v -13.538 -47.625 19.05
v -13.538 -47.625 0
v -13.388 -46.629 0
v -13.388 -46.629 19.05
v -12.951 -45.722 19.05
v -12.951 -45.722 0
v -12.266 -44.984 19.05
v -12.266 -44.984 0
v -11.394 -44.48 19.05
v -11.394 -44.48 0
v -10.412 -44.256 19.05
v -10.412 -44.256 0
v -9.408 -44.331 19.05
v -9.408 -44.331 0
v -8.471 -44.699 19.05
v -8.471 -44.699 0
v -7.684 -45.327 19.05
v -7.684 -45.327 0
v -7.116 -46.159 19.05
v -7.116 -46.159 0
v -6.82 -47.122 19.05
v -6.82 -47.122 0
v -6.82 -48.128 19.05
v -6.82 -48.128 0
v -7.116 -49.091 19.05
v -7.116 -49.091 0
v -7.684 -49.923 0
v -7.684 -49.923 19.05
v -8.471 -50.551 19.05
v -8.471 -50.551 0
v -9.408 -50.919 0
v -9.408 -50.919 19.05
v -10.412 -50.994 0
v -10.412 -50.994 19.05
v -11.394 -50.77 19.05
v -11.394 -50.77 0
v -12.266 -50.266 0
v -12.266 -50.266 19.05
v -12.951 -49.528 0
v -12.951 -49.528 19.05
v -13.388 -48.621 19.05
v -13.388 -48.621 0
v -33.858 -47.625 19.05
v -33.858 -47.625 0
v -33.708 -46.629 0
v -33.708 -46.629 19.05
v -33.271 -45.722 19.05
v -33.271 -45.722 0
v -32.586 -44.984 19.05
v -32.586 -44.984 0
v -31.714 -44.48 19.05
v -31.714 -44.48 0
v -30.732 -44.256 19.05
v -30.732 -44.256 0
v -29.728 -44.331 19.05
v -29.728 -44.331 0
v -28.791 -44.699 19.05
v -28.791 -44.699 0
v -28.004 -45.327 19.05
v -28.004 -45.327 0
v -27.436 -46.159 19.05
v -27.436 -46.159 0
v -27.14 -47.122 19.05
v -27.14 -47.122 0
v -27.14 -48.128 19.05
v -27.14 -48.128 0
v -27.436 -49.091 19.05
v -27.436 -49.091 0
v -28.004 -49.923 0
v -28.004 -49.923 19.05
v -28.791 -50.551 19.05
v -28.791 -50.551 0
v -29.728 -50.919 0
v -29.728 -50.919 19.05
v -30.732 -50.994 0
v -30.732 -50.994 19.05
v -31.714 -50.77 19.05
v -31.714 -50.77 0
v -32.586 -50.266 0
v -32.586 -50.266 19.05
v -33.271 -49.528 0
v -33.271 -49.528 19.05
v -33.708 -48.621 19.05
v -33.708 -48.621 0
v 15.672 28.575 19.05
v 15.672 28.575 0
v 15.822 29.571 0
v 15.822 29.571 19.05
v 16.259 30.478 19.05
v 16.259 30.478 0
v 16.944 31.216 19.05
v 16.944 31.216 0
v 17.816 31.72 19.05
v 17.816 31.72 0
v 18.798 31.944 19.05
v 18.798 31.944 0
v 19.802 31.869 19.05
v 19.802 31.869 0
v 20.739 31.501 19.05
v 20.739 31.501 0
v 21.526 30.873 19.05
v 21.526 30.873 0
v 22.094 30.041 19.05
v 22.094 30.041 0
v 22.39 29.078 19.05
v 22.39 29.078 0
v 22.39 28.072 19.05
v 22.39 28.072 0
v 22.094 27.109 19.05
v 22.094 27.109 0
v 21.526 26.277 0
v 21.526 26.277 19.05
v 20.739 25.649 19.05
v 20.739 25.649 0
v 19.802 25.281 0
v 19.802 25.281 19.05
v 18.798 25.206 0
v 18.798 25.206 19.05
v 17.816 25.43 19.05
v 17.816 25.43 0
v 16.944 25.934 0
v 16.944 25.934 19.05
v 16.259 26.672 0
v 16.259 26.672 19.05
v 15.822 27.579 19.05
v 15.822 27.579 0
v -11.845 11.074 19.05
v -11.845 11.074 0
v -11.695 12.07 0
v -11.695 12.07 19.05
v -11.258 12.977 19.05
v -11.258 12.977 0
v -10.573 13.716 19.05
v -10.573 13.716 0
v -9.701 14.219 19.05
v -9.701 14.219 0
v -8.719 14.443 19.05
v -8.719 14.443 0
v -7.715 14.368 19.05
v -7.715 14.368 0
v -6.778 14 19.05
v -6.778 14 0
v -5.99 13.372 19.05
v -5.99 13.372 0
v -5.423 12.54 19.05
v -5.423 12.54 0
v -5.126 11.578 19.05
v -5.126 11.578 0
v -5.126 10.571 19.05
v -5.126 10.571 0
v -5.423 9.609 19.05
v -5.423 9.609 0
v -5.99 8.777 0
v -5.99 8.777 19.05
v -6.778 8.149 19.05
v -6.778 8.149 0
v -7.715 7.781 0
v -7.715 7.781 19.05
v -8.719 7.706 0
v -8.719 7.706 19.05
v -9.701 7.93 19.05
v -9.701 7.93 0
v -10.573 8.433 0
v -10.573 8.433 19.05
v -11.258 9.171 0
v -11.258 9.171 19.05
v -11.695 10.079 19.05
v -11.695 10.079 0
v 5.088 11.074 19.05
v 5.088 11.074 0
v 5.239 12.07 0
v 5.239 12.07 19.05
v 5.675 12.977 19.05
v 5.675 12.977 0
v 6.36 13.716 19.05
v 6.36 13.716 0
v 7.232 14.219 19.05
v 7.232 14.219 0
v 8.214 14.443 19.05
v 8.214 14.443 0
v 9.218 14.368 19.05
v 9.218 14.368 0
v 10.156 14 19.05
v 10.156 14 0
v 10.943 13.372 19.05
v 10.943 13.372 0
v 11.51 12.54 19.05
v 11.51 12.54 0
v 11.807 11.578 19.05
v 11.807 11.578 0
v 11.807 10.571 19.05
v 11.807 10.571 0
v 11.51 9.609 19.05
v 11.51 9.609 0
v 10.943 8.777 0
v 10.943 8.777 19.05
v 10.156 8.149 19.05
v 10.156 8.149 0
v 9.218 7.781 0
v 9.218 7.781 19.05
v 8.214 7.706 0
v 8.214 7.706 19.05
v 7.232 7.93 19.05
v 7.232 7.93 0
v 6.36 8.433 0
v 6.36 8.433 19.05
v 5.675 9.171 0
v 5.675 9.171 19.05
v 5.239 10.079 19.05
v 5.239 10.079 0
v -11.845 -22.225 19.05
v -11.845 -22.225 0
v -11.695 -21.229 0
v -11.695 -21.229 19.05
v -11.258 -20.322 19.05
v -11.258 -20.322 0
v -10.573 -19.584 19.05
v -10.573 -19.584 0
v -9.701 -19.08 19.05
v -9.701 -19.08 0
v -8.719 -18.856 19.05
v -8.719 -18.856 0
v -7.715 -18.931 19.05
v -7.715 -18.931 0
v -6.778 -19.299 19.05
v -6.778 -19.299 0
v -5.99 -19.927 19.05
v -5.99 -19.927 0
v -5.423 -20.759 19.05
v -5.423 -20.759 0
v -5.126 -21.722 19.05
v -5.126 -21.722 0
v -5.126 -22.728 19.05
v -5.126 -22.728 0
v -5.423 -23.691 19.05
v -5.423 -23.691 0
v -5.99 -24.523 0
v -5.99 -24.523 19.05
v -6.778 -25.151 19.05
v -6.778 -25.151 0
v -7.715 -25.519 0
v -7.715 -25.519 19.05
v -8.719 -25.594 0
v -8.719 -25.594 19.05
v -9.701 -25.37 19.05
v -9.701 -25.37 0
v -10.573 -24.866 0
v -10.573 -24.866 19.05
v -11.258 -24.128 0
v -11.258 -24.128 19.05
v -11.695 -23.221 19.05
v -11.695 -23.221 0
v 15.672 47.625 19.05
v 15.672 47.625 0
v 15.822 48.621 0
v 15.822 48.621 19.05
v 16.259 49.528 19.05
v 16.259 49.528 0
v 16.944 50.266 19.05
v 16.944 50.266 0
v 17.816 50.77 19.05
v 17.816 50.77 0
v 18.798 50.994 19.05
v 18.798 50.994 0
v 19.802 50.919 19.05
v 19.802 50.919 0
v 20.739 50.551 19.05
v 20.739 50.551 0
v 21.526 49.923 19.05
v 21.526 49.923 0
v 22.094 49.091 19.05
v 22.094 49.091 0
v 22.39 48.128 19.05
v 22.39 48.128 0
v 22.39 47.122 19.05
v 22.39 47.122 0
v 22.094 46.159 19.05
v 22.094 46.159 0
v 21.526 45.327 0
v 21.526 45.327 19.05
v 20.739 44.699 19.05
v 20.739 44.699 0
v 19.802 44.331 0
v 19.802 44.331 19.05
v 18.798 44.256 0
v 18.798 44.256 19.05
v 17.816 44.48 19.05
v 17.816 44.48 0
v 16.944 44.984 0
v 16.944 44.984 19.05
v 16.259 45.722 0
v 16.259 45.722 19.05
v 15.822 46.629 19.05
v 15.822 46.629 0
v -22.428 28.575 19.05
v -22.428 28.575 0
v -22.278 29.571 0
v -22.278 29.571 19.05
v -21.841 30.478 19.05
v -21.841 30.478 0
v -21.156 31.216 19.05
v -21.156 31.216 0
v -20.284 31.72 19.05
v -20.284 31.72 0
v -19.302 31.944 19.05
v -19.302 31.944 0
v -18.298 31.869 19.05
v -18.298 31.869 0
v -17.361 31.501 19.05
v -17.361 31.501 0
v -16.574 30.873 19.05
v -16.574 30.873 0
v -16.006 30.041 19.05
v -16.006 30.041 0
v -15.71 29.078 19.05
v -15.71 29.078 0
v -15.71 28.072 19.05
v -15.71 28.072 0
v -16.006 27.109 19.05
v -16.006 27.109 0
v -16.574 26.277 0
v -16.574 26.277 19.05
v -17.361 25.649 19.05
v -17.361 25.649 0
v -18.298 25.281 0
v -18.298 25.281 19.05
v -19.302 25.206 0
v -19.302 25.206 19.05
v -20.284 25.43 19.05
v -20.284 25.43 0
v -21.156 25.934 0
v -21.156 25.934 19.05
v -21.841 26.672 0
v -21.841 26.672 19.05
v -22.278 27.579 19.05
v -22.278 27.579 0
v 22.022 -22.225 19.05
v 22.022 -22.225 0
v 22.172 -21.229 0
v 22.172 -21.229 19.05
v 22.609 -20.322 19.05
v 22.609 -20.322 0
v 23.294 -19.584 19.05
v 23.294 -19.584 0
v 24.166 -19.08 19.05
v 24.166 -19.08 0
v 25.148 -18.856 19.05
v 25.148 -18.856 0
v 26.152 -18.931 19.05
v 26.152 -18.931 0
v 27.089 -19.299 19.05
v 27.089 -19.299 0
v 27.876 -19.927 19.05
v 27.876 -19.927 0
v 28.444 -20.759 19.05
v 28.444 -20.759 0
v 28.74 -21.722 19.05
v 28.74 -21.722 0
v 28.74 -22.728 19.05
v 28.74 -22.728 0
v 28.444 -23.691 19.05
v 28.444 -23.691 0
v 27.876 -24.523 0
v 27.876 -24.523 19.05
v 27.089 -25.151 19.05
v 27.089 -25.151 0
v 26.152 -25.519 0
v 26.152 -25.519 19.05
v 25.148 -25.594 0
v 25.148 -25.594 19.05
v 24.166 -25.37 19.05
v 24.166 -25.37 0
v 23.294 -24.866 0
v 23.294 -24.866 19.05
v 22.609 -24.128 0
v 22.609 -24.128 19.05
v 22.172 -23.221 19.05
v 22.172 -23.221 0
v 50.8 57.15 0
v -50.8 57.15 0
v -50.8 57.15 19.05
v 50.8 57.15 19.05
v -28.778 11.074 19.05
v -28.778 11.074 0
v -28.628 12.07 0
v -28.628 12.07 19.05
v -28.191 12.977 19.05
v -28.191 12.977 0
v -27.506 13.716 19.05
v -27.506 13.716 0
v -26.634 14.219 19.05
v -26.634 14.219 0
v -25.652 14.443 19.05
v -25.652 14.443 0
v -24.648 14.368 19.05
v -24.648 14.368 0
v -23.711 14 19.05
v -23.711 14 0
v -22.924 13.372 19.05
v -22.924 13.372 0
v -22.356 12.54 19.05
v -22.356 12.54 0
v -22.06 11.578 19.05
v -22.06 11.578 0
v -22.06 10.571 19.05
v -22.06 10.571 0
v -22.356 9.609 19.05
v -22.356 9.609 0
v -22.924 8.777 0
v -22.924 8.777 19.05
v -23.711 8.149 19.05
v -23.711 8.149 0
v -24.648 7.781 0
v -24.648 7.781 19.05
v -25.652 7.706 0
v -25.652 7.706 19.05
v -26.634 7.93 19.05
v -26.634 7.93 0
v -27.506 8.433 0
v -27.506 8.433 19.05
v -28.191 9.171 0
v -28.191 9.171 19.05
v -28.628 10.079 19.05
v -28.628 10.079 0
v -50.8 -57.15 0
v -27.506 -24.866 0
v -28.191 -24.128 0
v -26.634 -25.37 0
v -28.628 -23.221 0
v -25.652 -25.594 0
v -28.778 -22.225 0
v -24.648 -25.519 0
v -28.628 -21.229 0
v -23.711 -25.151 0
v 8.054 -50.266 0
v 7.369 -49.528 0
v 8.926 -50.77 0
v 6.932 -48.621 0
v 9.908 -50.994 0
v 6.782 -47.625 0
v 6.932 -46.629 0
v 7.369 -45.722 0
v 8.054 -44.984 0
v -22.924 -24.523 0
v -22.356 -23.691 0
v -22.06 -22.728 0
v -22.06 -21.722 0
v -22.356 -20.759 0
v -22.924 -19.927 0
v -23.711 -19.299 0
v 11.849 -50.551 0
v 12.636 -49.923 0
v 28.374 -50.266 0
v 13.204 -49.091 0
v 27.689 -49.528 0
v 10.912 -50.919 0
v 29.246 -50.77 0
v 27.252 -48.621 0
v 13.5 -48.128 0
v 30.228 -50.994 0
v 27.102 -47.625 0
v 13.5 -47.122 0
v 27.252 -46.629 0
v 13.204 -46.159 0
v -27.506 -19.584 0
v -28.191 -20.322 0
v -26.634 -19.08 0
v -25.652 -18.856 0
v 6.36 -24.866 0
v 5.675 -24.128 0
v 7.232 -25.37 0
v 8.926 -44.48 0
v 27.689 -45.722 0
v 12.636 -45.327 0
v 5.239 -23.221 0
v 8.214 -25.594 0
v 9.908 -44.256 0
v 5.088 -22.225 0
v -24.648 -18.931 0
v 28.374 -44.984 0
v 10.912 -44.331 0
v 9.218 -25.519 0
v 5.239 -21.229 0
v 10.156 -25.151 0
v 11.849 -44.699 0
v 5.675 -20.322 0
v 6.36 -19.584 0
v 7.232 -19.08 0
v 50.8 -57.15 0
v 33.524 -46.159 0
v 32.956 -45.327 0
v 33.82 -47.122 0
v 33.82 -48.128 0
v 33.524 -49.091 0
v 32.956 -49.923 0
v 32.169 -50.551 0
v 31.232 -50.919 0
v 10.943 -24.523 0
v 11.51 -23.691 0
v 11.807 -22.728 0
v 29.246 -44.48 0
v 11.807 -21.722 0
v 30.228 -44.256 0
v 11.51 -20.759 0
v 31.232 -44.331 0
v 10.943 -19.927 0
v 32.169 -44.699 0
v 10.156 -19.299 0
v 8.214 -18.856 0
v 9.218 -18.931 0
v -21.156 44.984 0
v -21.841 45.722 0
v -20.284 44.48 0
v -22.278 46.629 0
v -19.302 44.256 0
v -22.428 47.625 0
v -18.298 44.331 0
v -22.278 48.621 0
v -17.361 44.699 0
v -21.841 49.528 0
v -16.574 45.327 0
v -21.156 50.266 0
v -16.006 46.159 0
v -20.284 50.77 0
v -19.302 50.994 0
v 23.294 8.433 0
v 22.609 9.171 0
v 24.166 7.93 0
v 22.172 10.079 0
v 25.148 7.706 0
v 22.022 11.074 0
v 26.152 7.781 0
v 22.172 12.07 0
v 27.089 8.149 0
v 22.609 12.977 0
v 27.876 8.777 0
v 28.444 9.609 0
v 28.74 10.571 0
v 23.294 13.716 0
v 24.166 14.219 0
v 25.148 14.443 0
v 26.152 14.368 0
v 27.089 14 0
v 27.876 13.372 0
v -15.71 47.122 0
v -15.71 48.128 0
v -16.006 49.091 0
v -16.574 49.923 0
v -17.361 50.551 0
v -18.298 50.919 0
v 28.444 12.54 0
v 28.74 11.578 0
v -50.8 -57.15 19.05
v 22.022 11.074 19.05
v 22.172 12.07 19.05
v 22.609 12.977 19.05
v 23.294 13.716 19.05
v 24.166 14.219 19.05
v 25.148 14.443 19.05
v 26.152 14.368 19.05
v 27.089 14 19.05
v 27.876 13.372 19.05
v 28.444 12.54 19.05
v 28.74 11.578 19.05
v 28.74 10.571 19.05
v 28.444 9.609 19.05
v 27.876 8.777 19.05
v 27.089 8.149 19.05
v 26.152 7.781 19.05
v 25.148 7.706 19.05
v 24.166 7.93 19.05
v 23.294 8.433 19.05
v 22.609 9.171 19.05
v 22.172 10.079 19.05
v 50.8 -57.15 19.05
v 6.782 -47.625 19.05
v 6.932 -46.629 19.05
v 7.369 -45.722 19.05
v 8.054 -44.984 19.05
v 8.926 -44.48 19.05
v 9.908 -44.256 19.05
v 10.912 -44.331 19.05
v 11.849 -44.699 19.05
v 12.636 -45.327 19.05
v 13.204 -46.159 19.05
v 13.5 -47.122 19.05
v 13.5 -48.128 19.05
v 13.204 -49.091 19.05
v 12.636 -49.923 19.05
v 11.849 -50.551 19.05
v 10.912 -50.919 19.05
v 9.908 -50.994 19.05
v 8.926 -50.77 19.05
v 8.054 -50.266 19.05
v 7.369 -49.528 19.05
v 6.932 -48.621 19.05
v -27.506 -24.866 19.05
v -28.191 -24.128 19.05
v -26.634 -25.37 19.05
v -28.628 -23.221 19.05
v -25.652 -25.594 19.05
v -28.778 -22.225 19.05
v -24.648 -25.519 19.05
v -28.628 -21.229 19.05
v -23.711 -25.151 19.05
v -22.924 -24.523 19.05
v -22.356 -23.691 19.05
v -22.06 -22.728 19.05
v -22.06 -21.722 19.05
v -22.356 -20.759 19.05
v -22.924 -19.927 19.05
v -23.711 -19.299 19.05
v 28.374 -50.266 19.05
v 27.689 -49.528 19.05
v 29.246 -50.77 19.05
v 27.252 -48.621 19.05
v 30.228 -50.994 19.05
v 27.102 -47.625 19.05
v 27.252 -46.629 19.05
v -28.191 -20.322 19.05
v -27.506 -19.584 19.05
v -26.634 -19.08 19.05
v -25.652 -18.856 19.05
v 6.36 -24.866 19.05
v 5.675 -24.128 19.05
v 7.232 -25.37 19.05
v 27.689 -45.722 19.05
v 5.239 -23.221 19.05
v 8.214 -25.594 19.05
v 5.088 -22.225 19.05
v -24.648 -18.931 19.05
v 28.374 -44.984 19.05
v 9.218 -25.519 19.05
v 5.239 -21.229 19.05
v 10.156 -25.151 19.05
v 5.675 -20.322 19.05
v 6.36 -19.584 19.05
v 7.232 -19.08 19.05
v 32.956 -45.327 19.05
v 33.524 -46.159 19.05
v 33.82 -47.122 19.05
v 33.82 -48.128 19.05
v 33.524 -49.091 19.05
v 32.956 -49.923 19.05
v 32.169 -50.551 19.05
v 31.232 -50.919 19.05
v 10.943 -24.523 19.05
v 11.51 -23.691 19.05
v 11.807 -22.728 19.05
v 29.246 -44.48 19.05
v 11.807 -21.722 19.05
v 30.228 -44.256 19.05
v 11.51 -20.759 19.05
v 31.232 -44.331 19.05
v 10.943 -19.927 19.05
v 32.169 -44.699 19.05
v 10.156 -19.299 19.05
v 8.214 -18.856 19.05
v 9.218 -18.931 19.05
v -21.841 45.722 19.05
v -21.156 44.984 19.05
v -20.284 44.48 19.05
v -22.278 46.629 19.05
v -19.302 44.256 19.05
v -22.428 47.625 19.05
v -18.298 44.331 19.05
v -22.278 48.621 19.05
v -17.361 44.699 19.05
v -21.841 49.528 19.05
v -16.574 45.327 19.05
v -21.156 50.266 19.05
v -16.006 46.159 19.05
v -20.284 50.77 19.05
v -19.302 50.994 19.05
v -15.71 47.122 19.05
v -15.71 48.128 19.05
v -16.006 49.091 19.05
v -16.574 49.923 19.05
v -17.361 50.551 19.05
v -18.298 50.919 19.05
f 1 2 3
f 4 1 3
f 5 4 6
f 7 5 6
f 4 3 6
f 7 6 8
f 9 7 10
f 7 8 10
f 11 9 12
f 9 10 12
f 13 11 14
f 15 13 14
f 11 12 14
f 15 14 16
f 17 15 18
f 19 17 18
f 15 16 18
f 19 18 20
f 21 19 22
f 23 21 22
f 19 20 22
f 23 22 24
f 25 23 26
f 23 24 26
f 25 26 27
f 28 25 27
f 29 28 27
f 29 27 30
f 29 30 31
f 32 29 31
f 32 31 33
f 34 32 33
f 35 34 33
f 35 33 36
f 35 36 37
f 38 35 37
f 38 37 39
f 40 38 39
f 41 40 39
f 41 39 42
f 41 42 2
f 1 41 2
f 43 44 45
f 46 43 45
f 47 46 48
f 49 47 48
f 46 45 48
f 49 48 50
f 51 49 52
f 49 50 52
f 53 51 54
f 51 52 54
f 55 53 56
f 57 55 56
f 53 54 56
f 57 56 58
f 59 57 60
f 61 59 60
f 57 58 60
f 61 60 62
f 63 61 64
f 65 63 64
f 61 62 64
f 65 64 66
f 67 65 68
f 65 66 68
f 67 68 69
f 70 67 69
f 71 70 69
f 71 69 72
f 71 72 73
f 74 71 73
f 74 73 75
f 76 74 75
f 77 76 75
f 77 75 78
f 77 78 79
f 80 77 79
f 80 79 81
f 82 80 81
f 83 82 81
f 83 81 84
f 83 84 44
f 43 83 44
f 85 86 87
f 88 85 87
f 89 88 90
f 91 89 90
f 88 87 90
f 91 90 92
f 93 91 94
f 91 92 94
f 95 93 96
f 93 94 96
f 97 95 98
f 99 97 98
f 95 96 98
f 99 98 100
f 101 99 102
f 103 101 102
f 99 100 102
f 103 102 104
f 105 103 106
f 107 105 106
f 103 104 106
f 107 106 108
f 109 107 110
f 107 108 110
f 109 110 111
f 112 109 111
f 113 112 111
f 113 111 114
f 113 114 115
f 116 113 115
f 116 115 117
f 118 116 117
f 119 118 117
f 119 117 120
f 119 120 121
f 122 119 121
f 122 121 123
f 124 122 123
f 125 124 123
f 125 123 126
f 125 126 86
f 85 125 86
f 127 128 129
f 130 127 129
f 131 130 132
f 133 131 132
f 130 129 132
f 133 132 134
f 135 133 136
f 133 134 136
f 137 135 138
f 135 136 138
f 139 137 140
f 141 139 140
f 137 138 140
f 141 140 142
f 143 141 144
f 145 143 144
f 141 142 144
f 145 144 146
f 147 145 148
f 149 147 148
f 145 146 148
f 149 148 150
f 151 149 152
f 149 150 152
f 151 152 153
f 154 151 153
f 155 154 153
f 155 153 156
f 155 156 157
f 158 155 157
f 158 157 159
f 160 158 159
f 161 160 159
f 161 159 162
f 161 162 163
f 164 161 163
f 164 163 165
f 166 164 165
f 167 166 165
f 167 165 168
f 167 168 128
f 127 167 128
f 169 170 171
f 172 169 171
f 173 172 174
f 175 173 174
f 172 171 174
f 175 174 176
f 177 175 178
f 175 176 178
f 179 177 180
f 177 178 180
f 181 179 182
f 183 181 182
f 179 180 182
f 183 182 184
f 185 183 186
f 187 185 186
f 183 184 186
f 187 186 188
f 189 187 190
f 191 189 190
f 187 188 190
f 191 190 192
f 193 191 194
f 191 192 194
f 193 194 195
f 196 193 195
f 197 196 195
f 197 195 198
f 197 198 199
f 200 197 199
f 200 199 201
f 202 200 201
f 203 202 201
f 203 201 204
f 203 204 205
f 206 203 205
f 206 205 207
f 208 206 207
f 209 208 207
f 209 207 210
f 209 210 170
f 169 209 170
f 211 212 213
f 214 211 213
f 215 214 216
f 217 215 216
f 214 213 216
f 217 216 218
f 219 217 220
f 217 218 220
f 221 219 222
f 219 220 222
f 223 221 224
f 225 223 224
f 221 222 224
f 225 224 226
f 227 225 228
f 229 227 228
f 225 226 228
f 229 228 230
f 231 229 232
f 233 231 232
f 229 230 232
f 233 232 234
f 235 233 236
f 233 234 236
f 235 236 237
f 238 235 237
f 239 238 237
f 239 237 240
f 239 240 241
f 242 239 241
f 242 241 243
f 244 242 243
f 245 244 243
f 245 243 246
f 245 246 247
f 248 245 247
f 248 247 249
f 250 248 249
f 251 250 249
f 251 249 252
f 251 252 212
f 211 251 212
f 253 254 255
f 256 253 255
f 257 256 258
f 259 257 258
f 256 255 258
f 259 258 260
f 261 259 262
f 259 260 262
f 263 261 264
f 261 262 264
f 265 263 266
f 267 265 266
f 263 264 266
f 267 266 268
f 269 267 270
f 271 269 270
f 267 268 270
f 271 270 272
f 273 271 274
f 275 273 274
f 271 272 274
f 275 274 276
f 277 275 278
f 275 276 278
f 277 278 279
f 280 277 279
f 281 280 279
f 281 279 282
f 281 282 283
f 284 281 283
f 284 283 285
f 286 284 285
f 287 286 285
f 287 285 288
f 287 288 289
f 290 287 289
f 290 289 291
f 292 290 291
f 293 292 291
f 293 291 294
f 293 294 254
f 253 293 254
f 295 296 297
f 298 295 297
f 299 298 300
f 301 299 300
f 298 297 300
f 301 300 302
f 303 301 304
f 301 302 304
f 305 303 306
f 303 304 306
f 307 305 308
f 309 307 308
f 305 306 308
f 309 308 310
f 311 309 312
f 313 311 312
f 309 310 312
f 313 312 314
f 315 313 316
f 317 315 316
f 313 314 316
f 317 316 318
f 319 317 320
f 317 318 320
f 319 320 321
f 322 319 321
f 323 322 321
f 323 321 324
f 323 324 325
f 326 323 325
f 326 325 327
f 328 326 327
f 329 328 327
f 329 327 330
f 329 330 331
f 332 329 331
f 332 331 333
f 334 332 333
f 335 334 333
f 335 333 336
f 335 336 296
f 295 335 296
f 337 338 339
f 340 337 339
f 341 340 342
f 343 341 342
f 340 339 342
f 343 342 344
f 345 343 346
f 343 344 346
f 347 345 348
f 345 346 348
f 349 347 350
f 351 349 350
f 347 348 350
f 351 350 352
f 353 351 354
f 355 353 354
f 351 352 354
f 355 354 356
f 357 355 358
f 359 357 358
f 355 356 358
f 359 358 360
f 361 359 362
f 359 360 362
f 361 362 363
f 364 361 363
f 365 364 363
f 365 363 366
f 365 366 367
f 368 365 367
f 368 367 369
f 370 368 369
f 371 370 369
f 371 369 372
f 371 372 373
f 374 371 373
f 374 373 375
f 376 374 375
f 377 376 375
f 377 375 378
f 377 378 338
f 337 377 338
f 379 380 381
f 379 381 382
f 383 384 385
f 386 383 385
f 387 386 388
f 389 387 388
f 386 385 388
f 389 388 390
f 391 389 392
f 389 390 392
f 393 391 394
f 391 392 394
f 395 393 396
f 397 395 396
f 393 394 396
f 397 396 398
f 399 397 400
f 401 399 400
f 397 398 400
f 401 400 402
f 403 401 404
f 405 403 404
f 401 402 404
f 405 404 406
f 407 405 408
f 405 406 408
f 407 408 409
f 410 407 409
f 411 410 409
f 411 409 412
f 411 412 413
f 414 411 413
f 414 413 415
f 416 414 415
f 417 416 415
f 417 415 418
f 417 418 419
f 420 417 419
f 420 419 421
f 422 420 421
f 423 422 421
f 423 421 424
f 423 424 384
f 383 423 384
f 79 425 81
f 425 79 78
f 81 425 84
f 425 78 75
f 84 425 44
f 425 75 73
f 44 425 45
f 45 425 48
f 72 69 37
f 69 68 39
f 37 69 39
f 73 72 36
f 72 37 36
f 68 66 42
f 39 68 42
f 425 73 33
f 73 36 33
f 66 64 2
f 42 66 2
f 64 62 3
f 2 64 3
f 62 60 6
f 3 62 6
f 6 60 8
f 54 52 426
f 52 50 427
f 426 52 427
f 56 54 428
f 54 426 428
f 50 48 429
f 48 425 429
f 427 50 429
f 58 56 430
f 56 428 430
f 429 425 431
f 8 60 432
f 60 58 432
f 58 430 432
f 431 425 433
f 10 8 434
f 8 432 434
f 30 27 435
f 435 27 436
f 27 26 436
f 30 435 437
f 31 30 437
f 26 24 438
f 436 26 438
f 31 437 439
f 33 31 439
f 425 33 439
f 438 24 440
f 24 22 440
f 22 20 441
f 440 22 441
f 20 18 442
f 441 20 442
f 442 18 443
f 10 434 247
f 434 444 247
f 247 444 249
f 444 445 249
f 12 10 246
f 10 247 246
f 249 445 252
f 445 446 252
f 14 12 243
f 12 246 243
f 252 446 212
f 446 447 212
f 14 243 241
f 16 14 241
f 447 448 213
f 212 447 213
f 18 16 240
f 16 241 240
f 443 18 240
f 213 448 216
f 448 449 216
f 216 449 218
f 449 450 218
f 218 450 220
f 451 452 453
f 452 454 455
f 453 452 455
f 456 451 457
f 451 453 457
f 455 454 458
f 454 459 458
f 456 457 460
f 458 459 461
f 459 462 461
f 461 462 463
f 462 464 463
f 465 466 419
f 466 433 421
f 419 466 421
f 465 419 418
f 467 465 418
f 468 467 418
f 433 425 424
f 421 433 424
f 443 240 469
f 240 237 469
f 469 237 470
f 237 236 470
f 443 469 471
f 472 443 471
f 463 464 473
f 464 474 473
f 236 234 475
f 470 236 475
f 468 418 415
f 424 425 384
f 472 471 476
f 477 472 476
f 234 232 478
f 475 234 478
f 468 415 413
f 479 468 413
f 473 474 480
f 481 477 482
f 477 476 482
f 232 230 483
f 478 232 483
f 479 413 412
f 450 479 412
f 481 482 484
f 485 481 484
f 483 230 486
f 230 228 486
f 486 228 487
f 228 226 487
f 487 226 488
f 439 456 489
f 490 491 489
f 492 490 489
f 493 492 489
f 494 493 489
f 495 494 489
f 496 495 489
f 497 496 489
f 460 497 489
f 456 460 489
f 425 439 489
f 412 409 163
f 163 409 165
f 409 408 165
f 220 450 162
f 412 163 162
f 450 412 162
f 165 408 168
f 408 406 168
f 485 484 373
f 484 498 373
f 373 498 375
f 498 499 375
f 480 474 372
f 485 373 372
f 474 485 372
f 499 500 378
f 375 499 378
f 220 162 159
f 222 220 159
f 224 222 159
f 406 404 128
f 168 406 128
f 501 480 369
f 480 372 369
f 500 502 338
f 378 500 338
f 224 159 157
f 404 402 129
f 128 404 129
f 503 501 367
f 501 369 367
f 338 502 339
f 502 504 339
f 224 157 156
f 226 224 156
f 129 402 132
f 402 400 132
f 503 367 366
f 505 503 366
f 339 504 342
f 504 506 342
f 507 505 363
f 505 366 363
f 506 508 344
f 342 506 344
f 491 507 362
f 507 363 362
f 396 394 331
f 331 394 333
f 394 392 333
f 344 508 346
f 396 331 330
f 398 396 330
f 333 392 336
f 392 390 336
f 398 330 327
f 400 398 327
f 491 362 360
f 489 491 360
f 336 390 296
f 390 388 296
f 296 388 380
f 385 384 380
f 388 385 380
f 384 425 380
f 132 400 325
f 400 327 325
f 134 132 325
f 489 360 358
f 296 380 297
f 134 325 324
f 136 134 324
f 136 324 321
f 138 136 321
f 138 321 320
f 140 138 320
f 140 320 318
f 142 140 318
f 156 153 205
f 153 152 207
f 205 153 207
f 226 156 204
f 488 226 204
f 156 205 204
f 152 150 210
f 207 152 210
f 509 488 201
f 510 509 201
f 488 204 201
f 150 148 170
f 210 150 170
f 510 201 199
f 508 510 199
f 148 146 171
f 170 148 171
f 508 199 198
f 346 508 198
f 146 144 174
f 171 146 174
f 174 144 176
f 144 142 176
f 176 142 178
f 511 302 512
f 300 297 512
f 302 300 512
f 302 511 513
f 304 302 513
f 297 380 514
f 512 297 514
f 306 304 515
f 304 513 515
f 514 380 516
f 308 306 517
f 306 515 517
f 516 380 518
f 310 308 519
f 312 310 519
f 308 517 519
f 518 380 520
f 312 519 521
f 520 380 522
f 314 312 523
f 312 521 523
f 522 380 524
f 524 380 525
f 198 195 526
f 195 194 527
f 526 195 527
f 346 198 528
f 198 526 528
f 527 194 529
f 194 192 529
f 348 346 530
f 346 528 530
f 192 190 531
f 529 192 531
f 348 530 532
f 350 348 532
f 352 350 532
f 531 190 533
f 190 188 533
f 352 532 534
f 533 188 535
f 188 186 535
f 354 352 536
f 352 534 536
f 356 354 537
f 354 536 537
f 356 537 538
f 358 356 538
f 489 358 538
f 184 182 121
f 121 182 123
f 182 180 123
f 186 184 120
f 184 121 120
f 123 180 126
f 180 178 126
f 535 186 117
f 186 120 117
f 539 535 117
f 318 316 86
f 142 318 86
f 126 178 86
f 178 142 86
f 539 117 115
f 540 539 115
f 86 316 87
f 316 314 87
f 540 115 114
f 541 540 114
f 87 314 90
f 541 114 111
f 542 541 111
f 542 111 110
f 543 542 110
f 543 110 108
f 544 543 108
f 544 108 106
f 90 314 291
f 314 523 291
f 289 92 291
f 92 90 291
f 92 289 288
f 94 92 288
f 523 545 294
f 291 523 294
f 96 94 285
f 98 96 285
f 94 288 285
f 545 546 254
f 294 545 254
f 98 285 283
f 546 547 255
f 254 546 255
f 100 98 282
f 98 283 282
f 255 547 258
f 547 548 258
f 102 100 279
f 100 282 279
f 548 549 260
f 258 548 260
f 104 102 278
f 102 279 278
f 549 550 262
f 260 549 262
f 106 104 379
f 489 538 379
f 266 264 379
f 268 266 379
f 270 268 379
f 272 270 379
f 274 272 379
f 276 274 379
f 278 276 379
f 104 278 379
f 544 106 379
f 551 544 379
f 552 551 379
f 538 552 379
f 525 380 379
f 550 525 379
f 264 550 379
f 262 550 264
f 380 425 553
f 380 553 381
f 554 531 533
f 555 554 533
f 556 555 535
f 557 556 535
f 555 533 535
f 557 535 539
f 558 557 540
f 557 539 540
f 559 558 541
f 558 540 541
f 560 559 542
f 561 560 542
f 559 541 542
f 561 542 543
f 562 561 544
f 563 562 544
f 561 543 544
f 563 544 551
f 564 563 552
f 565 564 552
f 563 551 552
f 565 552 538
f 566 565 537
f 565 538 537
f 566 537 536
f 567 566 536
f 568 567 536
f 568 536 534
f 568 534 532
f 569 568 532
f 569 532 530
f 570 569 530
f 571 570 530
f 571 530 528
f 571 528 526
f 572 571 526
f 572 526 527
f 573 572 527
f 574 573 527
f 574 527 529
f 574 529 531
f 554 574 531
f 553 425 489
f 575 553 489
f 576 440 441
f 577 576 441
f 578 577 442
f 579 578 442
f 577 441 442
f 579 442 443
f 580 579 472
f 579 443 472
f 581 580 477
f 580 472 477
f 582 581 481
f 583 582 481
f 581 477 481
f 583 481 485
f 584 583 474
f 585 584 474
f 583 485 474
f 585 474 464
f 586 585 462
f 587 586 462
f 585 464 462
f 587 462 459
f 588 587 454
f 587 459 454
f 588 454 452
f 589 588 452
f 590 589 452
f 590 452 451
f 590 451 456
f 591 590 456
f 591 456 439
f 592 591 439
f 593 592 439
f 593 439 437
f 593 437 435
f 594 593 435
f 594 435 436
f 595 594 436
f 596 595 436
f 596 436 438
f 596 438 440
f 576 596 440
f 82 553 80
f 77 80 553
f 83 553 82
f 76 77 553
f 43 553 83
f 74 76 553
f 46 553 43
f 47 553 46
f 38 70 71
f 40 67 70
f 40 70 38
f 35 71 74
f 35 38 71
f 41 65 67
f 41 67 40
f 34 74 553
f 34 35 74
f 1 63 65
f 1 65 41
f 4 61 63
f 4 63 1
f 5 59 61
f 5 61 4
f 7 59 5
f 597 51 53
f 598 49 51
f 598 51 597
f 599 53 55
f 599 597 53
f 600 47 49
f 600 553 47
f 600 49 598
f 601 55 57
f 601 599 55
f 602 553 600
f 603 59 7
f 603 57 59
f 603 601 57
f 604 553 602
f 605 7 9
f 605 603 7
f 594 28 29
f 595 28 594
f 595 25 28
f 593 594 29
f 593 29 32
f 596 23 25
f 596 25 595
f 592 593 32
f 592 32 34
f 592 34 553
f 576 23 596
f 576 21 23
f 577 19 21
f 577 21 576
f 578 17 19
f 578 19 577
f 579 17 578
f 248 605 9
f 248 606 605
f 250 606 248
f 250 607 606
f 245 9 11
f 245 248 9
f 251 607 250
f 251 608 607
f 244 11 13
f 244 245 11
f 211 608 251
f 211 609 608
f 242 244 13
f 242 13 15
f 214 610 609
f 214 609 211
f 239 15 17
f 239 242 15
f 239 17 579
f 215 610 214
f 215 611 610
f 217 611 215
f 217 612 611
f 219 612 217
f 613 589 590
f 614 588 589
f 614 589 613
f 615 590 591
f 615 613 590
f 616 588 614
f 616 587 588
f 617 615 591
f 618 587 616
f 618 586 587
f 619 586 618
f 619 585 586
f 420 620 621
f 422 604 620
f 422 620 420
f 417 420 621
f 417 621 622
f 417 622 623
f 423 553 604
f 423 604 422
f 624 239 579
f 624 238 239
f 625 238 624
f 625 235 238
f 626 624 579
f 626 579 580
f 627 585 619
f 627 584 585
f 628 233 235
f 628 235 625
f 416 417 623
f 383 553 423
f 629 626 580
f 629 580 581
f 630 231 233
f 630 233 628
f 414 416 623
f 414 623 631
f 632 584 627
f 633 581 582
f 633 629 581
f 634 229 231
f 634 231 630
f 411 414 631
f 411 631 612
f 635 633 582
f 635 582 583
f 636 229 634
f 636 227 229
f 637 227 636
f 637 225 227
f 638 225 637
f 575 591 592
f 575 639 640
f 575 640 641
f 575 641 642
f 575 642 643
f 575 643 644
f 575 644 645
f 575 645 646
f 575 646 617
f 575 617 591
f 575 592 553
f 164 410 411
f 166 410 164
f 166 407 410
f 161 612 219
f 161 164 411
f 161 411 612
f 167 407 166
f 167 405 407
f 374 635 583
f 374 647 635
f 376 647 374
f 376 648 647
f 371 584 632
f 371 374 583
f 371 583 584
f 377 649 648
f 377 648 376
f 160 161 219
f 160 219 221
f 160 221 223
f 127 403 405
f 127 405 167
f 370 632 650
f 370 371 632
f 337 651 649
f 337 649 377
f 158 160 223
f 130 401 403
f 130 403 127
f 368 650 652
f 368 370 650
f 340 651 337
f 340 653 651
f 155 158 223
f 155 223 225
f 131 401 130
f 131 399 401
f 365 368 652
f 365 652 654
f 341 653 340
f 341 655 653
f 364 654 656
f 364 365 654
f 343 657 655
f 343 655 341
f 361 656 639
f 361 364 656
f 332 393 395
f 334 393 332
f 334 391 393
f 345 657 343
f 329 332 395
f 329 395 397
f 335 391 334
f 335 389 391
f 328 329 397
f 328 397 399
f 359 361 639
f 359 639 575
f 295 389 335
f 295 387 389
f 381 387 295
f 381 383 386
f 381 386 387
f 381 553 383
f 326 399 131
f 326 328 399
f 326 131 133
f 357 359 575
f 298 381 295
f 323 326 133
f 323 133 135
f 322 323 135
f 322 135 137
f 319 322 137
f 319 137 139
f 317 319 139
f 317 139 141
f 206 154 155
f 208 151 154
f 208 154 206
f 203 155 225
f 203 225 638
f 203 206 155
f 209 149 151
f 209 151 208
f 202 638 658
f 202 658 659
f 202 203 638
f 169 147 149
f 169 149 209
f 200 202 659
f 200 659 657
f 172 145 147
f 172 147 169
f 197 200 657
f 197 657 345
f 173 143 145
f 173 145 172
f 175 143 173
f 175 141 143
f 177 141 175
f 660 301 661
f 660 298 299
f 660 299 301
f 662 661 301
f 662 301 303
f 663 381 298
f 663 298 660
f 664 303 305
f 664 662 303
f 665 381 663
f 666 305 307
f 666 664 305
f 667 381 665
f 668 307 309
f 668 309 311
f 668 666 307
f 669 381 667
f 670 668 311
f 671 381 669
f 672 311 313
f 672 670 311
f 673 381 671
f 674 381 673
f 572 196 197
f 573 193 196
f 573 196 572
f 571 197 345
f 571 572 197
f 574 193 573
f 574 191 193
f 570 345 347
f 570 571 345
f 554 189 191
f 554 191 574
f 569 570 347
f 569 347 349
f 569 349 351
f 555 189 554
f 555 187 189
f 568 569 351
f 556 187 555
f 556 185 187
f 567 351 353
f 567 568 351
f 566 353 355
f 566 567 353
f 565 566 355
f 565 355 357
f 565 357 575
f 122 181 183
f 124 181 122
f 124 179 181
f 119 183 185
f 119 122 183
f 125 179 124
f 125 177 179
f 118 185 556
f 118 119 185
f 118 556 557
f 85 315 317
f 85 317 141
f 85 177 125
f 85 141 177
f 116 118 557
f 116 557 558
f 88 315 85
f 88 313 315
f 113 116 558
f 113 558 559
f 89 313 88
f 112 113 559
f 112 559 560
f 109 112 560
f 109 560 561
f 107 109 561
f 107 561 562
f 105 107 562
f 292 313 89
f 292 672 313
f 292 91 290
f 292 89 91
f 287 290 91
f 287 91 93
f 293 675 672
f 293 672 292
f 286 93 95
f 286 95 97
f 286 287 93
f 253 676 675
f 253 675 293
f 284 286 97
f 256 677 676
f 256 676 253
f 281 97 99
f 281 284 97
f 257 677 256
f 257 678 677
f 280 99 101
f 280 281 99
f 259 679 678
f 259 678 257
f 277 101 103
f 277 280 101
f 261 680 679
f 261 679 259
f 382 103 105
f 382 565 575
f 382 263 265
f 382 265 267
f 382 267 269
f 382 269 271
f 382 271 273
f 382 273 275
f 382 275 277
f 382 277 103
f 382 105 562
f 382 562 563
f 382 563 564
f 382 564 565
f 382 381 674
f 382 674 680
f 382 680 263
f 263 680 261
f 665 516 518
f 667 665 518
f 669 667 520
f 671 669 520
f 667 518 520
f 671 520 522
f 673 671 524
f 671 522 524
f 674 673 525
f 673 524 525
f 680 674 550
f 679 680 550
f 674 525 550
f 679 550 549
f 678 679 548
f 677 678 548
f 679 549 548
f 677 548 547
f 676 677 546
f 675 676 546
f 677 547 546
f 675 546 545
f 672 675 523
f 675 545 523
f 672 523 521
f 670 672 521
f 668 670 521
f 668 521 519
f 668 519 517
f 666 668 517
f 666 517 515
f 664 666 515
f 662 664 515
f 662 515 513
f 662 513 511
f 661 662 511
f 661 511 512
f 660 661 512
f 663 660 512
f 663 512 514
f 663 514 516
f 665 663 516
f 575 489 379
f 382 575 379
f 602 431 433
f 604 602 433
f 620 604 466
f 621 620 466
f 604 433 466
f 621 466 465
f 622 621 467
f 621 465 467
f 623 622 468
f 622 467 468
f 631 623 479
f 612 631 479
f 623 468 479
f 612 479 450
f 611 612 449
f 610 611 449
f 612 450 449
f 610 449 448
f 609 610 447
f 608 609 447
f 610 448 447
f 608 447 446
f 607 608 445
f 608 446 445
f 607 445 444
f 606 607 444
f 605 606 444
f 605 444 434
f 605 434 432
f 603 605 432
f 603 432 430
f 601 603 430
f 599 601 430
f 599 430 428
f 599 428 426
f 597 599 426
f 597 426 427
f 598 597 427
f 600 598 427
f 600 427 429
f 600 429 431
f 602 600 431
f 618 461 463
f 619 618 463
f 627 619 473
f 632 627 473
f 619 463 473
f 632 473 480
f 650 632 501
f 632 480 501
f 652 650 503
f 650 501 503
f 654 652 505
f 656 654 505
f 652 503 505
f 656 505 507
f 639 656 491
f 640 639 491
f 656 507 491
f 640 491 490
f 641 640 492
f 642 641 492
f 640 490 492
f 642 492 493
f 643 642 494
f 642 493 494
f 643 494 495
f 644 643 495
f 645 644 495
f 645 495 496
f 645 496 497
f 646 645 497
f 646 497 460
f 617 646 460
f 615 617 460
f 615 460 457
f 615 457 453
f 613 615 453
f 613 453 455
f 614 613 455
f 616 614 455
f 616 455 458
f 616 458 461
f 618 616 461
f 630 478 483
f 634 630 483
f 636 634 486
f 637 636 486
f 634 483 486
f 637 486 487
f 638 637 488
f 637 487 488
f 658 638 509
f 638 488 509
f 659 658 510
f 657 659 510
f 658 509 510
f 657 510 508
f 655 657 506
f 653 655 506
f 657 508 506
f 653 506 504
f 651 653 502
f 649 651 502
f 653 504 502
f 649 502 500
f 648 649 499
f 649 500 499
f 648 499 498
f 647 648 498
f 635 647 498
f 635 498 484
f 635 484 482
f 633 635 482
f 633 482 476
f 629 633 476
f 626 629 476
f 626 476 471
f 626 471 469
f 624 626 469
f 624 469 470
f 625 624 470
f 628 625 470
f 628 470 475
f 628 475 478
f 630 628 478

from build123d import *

# Parameters (mm, degrees)
F0_W     = 101.6
F0_H     = 114.3
F1_DEPTH = 19.05
F3_D     = 6.7564


# Not quite as in the source:
# - a feature names something its author has since deleted; it is built from what else it names


with BuildPart() as f1:
    # F0 (on Top) → F1 (new body)
    with BuildSketch(Plane.XY):
        Rectangle(F0_W, F0_H)
    extrude(amount=F1_DEPTH)

    # F3 (through all)
    with Locations(Plane.XY.offset(19.05)):
        with Locations((-30.48, -47.625), (-10.16, -47.625), (10.16, -47.625), (30.48, -47.625), (-19.05, 47.625), (-25.4, 11.0744), (-25.4, -22.225), (-8.4666666667, -22.225), (-8.4666666667, 11.0744), (8.4666666667, 11.0744), (8.4666666667, -22.225), (25.4, -22.225), (25.4, 11.0744), (19.05, 47.625), (-19.05, 28.575), (19.05, 28.575)):
            Hole(F3_D / 2)


solid = f1.part
